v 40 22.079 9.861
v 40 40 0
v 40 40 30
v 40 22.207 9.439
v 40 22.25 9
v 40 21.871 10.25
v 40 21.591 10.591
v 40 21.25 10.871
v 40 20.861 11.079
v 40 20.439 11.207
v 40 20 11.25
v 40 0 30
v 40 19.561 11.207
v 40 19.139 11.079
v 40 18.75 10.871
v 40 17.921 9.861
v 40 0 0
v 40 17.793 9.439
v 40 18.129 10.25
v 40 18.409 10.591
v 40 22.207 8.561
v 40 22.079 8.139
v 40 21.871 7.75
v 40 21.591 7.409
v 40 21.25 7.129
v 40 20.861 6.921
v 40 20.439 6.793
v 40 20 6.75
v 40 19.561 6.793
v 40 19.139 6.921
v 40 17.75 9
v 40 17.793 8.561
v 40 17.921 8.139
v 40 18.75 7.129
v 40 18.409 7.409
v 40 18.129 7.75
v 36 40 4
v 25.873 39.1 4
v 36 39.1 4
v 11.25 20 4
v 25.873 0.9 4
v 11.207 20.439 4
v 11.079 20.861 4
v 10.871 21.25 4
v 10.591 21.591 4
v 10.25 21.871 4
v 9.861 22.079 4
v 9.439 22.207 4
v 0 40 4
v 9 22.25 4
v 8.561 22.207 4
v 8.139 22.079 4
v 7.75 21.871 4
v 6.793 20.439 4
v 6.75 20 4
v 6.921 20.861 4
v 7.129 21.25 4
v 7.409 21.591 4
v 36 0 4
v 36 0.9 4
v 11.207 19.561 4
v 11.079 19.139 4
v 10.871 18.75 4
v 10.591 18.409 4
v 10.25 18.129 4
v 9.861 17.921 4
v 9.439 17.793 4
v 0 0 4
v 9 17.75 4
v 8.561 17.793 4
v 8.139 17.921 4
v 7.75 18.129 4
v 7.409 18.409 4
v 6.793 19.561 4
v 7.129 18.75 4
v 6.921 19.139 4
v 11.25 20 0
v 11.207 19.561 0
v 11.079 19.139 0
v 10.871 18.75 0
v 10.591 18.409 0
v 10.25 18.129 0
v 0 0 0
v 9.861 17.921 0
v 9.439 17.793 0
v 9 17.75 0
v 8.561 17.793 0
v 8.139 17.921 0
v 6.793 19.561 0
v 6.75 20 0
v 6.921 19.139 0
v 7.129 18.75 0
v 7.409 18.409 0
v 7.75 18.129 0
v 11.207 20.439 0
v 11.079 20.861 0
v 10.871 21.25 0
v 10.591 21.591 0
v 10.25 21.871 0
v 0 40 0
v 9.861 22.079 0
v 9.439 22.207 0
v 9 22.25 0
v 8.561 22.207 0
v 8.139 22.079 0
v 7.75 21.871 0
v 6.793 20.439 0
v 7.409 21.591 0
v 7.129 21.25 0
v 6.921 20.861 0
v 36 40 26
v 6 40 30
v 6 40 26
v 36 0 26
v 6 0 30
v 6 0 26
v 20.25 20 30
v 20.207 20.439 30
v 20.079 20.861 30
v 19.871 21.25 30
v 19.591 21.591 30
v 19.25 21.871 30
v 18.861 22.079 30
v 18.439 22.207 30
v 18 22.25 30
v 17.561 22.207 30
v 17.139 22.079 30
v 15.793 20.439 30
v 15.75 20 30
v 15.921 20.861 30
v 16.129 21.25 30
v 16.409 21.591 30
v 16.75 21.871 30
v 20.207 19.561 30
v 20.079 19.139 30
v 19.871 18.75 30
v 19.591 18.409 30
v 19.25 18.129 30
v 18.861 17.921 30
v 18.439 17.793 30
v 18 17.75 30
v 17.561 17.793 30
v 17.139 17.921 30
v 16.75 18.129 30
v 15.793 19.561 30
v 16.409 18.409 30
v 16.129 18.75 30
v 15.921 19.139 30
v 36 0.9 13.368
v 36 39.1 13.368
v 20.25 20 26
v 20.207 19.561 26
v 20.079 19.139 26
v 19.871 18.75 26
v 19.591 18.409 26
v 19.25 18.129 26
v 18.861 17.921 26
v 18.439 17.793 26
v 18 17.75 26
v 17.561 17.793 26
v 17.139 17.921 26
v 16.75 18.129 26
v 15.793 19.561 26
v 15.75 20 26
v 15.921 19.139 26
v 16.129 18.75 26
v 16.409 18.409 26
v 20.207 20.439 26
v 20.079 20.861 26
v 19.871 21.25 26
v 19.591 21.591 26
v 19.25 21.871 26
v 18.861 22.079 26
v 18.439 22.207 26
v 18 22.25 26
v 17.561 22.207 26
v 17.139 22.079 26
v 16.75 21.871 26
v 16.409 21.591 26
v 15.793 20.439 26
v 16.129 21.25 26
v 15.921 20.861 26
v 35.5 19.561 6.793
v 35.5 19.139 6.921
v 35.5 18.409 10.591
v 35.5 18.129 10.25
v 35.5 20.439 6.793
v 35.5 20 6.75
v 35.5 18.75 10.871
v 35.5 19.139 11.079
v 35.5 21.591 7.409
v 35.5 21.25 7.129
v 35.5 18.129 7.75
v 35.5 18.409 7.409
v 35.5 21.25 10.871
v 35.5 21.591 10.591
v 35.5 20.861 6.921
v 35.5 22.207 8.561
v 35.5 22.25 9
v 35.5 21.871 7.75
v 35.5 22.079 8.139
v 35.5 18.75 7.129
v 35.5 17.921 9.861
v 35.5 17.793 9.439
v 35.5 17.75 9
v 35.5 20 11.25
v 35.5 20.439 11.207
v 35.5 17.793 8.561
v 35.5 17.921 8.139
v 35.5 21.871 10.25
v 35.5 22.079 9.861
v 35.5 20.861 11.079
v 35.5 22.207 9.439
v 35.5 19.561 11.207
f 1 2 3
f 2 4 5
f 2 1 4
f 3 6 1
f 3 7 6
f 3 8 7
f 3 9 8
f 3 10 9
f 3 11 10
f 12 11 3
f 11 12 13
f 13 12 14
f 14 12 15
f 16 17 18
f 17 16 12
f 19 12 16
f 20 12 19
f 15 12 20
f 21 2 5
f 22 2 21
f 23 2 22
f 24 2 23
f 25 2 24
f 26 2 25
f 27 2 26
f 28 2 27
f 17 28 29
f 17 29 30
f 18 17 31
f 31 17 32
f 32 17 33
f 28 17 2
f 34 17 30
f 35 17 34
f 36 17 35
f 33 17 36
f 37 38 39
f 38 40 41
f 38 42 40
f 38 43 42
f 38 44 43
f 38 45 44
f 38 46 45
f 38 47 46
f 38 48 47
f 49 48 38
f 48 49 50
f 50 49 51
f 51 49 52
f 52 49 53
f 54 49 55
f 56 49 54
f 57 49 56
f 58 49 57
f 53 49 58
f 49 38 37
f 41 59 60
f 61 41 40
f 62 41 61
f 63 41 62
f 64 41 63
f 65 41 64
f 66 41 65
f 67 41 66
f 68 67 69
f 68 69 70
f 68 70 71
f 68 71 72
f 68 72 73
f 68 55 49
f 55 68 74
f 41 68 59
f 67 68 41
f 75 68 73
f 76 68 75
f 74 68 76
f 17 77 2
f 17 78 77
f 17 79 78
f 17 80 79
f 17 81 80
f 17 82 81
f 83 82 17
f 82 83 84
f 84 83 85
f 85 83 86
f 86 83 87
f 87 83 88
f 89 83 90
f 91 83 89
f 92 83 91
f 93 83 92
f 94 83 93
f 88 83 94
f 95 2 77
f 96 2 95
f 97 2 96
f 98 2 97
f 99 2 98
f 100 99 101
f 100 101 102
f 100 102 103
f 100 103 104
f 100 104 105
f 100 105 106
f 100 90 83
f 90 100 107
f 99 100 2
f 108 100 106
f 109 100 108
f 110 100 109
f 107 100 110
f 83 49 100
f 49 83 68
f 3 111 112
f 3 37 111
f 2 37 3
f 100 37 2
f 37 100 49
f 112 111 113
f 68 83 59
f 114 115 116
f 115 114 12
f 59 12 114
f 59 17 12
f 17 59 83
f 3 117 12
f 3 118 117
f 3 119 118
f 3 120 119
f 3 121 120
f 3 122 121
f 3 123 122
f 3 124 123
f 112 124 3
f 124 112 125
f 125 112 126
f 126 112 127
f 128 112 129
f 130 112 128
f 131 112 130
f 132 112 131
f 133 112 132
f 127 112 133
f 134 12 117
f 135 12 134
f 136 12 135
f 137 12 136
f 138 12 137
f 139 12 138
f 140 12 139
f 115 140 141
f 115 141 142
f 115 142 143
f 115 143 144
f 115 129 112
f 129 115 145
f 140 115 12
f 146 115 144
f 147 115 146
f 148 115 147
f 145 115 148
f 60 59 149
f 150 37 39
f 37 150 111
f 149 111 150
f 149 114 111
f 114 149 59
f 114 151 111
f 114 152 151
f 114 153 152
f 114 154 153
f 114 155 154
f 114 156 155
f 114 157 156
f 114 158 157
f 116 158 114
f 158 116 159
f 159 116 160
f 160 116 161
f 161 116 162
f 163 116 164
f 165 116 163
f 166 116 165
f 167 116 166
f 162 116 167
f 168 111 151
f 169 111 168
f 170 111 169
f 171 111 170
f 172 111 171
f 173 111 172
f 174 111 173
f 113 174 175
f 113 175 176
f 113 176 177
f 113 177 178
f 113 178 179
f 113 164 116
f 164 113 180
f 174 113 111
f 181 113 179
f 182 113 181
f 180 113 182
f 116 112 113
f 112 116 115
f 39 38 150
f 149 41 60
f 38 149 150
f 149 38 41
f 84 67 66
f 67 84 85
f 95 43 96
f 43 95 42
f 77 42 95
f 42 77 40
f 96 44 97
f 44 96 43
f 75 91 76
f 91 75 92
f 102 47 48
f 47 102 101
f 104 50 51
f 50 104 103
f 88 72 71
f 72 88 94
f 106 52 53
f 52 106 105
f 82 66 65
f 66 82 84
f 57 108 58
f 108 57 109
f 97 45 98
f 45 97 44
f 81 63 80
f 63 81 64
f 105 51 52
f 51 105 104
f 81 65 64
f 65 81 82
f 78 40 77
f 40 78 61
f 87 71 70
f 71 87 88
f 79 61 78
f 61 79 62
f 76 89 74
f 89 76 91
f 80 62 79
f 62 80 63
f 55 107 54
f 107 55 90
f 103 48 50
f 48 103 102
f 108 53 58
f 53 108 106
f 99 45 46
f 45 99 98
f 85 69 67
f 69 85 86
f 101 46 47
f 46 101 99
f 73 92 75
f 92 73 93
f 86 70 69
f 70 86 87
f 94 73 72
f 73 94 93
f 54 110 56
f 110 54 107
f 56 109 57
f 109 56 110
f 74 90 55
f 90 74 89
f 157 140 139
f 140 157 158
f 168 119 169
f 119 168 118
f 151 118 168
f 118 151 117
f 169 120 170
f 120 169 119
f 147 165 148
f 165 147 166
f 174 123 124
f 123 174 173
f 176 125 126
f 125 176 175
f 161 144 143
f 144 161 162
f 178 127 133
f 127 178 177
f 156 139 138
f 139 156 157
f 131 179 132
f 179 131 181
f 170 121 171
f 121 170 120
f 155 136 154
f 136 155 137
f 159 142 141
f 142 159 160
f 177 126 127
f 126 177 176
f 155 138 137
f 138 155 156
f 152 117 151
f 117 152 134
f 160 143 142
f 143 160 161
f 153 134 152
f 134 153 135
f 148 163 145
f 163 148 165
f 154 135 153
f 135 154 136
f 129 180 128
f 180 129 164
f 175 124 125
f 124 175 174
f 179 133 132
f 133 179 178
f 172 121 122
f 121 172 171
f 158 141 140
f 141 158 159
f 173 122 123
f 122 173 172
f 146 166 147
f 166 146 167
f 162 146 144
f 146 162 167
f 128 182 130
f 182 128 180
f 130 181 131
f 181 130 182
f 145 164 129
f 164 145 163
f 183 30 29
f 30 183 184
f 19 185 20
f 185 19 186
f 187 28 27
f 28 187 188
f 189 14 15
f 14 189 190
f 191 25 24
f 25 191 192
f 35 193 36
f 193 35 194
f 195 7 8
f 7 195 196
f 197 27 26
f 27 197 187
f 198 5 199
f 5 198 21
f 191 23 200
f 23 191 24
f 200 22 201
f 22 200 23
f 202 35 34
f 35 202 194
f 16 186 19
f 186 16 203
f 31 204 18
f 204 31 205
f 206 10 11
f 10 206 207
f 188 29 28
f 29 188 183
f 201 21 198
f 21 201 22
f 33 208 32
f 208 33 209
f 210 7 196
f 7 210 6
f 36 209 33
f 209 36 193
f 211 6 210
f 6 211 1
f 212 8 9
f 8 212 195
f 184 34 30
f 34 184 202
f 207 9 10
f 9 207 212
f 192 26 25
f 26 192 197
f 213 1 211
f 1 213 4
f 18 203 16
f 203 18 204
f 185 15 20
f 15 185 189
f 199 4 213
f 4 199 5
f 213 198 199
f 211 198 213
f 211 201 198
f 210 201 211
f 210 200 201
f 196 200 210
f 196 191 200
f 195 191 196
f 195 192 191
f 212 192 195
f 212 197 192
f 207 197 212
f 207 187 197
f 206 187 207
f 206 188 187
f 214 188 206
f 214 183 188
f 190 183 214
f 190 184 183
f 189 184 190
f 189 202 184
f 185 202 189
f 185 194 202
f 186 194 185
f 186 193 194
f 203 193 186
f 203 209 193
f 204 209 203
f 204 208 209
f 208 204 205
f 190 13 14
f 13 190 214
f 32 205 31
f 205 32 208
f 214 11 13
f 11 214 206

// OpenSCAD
$fn = 32;

// ----------------------------------------------------------------------
// Z-bracket: 40 x 40 x 30 mm
// ----------------------------------------------------------------------

// --- parameters (mm) ---
foot_len = 40;            // lower foot length, X
top_len = 30;             // upper foot length, X
depth = 40;               // bracket width, Y
step_h = 30;              // overall rise, Z
plate_t = 4;              // plate thickness
hole_d = 4.5;             // clearance for M4
rib_len = 11.1;           // gusset leg
rib_sink = 0.9;           // gusset overlap into the plates

module hole_z(px, py, z0) {
  translate([px, py, z0 - 0.5]) cylinder(h = plate_t + 1, d = hole_d);
}
module hole_x(py, pz) {
  translate([-0.5, py, pz]) rotate([0, 90, 0]) cylinder(h = plate_t + 1, d = hole_d);
}
module gusset(x0) {
  translate([x0, depth - rib_sink, 0])
    rotate([90, 0, 0])
      linear_extrude(height = depth - 2 * rib_sink)
        polygon(points = [[rib_sink, plate_t - rib_sink],
                          [rib_sink, plate_t - rib_sink + rib_len],
                          [-rib_len, plate_t - rib_sink]]);
}

difference() {
  union() {
    cube([foot_len, depth, plate_t]);
    /* web, overlapping the lower foot */
    translate([foot_len - plate_t, 0, 0]) cube([plate_t, depth, step_h]);
    /* upper foot, sunk into the web */
    translate([foot_len - plate_t - top_len, 0, step_h - plate_t]) cube([top_len + plate_t, depth, plate_t]);
    gusset(foot_len - plate_t);
  }
  hole_z(9, 20, 0);
  translate([foot_len - plate_t - 18, 0, 0]) hole_z(0, 20, step_h - plate_t);
  translate([foot_len - plate_t, 0, 0]) hole_x(20, 9);
}
